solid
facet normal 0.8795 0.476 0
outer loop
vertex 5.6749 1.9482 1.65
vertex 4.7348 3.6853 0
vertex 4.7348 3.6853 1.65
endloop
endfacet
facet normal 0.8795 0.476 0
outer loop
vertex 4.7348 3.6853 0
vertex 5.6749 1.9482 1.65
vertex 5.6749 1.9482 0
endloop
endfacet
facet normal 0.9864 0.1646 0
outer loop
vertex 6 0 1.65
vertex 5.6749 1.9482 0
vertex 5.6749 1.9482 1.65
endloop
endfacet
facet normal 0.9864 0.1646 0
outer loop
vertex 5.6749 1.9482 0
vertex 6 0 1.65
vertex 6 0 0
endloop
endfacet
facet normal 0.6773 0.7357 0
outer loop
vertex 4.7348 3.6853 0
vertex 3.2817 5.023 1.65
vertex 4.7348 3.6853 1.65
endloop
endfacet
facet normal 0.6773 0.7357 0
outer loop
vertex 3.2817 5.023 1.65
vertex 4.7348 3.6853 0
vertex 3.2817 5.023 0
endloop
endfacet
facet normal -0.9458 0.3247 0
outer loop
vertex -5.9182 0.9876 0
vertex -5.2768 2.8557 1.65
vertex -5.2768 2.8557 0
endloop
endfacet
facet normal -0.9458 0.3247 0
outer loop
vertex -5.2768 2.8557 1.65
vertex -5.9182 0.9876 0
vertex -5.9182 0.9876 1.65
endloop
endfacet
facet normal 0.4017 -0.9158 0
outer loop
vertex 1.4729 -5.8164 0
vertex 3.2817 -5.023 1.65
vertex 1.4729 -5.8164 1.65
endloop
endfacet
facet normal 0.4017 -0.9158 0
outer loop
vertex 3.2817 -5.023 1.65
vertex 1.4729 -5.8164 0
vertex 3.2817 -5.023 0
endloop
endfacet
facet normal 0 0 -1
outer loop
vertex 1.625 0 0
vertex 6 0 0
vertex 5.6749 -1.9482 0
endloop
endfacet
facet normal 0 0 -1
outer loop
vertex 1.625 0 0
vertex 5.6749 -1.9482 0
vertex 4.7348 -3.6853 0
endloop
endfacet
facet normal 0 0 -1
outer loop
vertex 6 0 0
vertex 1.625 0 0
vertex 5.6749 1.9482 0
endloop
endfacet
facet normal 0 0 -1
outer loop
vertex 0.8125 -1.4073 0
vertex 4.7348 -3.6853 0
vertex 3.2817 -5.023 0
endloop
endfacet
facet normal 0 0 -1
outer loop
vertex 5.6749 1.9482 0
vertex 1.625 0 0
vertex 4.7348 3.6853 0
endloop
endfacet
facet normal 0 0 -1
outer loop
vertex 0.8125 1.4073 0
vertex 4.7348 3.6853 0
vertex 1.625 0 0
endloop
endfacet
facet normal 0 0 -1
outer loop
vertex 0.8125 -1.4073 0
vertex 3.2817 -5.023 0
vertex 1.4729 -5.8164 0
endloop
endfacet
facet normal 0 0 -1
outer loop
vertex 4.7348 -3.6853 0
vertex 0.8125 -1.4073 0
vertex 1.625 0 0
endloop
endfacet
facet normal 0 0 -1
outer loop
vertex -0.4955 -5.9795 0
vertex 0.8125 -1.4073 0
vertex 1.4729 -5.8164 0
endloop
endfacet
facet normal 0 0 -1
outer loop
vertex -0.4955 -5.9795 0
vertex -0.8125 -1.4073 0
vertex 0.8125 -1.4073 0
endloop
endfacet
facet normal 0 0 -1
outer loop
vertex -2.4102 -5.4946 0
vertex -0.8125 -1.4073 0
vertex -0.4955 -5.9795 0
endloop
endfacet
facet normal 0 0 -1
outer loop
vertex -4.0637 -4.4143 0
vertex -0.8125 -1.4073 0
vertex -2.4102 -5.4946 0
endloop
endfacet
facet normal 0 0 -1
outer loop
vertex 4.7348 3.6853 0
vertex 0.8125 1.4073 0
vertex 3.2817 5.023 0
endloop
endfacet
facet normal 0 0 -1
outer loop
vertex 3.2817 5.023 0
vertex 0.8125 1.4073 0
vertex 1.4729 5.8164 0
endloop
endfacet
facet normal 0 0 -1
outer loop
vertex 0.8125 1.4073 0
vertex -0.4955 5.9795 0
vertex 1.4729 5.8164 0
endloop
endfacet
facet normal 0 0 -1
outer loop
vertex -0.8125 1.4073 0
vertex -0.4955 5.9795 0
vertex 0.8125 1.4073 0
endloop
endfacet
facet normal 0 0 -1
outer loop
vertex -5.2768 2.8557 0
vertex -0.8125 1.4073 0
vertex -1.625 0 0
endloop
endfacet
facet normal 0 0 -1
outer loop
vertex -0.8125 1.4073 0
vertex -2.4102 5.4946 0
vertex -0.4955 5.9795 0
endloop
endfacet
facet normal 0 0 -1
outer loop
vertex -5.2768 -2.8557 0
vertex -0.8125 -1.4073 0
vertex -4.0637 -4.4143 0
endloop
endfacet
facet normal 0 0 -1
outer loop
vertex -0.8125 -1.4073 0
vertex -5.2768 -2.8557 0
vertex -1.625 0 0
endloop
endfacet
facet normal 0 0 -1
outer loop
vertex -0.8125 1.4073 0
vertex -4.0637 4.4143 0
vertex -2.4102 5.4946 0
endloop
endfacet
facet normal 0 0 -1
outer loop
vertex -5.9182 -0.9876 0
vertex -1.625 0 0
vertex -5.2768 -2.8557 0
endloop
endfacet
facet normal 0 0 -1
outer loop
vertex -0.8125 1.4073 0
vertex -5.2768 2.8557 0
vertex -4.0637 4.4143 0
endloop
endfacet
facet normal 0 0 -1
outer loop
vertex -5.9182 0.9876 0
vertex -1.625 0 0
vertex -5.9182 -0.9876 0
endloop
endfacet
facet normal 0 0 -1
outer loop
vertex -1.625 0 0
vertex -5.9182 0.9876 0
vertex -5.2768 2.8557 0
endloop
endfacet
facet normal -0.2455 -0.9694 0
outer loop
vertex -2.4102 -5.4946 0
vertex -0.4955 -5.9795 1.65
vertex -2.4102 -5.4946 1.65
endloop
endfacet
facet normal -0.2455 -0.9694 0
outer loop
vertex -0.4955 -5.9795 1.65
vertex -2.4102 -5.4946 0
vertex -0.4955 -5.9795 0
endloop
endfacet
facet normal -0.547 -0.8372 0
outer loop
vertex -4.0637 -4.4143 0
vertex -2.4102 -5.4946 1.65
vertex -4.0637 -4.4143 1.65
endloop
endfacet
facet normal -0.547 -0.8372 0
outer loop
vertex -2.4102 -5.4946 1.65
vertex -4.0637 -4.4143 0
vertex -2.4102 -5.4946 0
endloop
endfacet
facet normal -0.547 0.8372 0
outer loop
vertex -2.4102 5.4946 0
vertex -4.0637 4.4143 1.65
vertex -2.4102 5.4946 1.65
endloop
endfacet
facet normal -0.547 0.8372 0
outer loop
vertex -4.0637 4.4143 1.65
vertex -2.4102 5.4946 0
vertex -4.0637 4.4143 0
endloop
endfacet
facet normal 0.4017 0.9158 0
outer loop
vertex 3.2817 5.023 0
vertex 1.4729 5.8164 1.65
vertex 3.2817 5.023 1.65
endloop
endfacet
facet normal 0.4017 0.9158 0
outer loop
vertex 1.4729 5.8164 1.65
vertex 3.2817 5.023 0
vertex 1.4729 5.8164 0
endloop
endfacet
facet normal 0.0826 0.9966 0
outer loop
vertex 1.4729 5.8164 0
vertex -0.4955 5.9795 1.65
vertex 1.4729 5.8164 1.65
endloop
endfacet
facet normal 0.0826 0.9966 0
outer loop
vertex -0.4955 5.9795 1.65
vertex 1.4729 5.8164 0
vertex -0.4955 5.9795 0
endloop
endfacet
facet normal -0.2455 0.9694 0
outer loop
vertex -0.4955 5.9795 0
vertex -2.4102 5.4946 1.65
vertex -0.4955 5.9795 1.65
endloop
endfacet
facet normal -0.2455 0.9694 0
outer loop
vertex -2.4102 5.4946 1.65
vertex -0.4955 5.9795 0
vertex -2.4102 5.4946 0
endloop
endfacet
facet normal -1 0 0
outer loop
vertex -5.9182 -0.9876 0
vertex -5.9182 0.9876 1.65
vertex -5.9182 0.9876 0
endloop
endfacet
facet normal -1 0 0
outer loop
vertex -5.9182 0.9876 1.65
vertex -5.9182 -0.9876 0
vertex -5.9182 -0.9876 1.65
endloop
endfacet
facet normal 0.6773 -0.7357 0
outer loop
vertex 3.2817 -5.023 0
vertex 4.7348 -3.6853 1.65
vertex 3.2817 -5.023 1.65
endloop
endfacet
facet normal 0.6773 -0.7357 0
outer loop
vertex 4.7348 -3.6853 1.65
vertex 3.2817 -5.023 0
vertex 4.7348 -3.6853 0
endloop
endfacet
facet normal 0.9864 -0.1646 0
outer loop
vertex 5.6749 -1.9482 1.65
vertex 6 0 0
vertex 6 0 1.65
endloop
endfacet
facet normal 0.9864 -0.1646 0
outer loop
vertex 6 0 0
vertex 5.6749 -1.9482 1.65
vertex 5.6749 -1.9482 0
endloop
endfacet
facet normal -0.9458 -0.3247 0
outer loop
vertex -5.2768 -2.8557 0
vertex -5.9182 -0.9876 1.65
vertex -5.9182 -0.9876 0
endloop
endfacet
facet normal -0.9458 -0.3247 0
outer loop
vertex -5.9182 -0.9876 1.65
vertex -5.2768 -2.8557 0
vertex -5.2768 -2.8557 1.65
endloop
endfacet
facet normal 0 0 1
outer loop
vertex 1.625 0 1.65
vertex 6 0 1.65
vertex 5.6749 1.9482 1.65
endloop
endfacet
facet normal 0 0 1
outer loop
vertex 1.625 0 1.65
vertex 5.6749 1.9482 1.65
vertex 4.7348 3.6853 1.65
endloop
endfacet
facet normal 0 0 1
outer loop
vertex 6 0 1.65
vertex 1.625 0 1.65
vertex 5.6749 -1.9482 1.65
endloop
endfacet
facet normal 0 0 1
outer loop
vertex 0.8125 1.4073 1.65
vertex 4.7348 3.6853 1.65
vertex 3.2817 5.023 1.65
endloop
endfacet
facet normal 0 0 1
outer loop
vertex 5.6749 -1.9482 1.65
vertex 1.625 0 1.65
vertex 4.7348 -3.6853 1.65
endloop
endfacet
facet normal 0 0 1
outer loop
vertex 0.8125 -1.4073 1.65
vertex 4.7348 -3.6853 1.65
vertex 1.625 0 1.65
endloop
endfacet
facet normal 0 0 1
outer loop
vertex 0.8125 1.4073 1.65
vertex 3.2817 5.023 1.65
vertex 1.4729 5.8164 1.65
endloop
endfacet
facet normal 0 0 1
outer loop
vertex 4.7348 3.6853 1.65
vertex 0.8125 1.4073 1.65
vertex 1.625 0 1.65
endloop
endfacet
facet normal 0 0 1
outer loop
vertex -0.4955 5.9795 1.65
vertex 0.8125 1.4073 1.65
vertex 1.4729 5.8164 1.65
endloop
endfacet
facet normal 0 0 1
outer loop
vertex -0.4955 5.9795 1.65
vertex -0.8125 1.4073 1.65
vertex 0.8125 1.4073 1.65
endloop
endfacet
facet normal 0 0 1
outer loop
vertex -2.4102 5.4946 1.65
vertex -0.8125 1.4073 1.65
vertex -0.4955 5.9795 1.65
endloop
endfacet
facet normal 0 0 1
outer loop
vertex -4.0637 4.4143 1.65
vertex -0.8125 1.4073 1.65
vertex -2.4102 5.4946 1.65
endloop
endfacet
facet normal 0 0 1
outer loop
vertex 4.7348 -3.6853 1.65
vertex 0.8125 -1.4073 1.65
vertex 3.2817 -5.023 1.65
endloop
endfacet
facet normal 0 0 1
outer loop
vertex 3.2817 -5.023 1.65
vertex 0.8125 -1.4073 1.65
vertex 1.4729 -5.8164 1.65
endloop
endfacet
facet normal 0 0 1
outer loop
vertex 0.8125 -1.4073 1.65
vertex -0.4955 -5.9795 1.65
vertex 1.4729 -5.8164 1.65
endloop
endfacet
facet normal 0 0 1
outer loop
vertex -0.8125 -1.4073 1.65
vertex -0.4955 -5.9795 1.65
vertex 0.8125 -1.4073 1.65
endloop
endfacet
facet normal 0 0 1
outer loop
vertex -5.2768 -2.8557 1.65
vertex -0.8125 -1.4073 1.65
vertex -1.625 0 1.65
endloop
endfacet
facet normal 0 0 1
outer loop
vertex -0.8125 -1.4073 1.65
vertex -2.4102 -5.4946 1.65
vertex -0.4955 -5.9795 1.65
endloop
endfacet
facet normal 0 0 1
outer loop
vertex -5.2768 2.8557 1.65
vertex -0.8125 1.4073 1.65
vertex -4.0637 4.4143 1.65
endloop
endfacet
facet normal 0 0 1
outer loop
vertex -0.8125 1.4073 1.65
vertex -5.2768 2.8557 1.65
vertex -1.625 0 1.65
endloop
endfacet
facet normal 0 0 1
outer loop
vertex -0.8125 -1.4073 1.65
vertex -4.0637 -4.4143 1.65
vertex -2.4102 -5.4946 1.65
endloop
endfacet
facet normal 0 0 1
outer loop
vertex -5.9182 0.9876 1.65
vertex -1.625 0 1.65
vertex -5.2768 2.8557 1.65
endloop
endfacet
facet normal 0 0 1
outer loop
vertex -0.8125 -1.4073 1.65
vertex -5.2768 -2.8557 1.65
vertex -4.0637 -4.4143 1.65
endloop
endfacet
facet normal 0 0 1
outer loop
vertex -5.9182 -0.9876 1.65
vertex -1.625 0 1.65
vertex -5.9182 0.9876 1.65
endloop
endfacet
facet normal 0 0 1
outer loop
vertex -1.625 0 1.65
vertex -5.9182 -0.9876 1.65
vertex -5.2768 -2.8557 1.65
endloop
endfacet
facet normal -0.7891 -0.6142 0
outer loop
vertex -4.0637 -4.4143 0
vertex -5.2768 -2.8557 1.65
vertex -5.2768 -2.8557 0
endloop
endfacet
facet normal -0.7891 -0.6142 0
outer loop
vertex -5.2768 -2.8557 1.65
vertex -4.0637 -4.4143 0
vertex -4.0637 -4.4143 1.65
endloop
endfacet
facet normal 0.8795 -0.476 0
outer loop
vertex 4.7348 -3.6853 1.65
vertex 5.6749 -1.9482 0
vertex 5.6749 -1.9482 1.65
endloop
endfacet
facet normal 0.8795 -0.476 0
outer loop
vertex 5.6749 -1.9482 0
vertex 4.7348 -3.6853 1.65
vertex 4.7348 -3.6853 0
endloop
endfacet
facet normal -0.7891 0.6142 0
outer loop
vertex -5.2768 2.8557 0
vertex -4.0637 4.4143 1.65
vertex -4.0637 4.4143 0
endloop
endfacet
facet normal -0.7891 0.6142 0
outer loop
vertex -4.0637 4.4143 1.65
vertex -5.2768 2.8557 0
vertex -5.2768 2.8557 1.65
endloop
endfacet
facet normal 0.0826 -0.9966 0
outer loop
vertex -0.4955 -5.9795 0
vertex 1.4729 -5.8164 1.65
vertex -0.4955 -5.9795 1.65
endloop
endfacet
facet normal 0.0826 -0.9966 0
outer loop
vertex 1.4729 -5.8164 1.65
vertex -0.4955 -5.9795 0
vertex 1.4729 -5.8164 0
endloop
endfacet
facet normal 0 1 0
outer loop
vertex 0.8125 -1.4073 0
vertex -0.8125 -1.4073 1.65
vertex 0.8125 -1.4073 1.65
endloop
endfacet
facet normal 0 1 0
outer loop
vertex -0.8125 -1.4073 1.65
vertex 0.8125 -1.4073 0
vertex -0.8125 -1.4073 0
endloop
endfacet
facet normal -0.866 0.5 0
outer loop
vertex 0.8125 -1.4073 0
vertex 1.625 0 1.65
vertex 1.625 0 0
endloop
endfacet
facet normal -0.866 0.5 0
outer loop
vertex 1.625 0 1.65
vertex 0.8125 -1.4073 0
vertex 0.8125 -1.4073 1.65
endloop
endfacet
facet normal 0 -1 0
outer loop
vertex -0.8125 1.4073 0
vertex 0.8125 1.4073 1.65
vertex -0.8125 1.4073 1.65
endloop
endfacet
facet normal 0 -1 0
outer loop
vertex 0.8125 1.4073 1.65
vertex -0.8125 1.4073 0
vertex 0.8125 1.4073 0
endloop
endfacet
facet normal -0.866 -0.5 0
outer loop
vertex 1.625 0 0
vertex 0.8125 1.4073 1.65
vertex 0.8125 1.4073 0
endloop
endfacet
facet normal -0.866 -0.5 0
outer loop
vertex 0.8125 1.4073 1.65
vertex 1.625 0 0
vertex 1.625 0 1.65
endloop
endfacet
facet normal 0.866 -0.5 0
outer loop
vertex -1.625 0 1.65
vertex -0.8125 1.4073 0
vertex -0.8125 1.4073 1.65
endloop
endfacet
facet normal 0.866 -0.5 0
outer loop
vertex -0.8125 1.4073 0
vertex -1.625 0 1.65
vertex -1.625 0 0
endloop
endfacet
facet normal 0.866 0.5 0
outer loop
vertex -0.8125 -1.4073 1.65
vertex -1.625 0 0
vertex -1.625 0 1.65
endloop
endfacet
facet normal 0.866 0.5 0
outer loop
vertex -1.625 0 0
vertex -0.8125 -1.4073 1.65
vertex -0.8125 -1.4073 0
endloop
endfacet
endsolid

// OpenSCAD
h = 6.40 - 4.75;
difference(){
cylinder(h = h, r = 12/2);
cylinder(h = h, r = 3.25/2);
}
